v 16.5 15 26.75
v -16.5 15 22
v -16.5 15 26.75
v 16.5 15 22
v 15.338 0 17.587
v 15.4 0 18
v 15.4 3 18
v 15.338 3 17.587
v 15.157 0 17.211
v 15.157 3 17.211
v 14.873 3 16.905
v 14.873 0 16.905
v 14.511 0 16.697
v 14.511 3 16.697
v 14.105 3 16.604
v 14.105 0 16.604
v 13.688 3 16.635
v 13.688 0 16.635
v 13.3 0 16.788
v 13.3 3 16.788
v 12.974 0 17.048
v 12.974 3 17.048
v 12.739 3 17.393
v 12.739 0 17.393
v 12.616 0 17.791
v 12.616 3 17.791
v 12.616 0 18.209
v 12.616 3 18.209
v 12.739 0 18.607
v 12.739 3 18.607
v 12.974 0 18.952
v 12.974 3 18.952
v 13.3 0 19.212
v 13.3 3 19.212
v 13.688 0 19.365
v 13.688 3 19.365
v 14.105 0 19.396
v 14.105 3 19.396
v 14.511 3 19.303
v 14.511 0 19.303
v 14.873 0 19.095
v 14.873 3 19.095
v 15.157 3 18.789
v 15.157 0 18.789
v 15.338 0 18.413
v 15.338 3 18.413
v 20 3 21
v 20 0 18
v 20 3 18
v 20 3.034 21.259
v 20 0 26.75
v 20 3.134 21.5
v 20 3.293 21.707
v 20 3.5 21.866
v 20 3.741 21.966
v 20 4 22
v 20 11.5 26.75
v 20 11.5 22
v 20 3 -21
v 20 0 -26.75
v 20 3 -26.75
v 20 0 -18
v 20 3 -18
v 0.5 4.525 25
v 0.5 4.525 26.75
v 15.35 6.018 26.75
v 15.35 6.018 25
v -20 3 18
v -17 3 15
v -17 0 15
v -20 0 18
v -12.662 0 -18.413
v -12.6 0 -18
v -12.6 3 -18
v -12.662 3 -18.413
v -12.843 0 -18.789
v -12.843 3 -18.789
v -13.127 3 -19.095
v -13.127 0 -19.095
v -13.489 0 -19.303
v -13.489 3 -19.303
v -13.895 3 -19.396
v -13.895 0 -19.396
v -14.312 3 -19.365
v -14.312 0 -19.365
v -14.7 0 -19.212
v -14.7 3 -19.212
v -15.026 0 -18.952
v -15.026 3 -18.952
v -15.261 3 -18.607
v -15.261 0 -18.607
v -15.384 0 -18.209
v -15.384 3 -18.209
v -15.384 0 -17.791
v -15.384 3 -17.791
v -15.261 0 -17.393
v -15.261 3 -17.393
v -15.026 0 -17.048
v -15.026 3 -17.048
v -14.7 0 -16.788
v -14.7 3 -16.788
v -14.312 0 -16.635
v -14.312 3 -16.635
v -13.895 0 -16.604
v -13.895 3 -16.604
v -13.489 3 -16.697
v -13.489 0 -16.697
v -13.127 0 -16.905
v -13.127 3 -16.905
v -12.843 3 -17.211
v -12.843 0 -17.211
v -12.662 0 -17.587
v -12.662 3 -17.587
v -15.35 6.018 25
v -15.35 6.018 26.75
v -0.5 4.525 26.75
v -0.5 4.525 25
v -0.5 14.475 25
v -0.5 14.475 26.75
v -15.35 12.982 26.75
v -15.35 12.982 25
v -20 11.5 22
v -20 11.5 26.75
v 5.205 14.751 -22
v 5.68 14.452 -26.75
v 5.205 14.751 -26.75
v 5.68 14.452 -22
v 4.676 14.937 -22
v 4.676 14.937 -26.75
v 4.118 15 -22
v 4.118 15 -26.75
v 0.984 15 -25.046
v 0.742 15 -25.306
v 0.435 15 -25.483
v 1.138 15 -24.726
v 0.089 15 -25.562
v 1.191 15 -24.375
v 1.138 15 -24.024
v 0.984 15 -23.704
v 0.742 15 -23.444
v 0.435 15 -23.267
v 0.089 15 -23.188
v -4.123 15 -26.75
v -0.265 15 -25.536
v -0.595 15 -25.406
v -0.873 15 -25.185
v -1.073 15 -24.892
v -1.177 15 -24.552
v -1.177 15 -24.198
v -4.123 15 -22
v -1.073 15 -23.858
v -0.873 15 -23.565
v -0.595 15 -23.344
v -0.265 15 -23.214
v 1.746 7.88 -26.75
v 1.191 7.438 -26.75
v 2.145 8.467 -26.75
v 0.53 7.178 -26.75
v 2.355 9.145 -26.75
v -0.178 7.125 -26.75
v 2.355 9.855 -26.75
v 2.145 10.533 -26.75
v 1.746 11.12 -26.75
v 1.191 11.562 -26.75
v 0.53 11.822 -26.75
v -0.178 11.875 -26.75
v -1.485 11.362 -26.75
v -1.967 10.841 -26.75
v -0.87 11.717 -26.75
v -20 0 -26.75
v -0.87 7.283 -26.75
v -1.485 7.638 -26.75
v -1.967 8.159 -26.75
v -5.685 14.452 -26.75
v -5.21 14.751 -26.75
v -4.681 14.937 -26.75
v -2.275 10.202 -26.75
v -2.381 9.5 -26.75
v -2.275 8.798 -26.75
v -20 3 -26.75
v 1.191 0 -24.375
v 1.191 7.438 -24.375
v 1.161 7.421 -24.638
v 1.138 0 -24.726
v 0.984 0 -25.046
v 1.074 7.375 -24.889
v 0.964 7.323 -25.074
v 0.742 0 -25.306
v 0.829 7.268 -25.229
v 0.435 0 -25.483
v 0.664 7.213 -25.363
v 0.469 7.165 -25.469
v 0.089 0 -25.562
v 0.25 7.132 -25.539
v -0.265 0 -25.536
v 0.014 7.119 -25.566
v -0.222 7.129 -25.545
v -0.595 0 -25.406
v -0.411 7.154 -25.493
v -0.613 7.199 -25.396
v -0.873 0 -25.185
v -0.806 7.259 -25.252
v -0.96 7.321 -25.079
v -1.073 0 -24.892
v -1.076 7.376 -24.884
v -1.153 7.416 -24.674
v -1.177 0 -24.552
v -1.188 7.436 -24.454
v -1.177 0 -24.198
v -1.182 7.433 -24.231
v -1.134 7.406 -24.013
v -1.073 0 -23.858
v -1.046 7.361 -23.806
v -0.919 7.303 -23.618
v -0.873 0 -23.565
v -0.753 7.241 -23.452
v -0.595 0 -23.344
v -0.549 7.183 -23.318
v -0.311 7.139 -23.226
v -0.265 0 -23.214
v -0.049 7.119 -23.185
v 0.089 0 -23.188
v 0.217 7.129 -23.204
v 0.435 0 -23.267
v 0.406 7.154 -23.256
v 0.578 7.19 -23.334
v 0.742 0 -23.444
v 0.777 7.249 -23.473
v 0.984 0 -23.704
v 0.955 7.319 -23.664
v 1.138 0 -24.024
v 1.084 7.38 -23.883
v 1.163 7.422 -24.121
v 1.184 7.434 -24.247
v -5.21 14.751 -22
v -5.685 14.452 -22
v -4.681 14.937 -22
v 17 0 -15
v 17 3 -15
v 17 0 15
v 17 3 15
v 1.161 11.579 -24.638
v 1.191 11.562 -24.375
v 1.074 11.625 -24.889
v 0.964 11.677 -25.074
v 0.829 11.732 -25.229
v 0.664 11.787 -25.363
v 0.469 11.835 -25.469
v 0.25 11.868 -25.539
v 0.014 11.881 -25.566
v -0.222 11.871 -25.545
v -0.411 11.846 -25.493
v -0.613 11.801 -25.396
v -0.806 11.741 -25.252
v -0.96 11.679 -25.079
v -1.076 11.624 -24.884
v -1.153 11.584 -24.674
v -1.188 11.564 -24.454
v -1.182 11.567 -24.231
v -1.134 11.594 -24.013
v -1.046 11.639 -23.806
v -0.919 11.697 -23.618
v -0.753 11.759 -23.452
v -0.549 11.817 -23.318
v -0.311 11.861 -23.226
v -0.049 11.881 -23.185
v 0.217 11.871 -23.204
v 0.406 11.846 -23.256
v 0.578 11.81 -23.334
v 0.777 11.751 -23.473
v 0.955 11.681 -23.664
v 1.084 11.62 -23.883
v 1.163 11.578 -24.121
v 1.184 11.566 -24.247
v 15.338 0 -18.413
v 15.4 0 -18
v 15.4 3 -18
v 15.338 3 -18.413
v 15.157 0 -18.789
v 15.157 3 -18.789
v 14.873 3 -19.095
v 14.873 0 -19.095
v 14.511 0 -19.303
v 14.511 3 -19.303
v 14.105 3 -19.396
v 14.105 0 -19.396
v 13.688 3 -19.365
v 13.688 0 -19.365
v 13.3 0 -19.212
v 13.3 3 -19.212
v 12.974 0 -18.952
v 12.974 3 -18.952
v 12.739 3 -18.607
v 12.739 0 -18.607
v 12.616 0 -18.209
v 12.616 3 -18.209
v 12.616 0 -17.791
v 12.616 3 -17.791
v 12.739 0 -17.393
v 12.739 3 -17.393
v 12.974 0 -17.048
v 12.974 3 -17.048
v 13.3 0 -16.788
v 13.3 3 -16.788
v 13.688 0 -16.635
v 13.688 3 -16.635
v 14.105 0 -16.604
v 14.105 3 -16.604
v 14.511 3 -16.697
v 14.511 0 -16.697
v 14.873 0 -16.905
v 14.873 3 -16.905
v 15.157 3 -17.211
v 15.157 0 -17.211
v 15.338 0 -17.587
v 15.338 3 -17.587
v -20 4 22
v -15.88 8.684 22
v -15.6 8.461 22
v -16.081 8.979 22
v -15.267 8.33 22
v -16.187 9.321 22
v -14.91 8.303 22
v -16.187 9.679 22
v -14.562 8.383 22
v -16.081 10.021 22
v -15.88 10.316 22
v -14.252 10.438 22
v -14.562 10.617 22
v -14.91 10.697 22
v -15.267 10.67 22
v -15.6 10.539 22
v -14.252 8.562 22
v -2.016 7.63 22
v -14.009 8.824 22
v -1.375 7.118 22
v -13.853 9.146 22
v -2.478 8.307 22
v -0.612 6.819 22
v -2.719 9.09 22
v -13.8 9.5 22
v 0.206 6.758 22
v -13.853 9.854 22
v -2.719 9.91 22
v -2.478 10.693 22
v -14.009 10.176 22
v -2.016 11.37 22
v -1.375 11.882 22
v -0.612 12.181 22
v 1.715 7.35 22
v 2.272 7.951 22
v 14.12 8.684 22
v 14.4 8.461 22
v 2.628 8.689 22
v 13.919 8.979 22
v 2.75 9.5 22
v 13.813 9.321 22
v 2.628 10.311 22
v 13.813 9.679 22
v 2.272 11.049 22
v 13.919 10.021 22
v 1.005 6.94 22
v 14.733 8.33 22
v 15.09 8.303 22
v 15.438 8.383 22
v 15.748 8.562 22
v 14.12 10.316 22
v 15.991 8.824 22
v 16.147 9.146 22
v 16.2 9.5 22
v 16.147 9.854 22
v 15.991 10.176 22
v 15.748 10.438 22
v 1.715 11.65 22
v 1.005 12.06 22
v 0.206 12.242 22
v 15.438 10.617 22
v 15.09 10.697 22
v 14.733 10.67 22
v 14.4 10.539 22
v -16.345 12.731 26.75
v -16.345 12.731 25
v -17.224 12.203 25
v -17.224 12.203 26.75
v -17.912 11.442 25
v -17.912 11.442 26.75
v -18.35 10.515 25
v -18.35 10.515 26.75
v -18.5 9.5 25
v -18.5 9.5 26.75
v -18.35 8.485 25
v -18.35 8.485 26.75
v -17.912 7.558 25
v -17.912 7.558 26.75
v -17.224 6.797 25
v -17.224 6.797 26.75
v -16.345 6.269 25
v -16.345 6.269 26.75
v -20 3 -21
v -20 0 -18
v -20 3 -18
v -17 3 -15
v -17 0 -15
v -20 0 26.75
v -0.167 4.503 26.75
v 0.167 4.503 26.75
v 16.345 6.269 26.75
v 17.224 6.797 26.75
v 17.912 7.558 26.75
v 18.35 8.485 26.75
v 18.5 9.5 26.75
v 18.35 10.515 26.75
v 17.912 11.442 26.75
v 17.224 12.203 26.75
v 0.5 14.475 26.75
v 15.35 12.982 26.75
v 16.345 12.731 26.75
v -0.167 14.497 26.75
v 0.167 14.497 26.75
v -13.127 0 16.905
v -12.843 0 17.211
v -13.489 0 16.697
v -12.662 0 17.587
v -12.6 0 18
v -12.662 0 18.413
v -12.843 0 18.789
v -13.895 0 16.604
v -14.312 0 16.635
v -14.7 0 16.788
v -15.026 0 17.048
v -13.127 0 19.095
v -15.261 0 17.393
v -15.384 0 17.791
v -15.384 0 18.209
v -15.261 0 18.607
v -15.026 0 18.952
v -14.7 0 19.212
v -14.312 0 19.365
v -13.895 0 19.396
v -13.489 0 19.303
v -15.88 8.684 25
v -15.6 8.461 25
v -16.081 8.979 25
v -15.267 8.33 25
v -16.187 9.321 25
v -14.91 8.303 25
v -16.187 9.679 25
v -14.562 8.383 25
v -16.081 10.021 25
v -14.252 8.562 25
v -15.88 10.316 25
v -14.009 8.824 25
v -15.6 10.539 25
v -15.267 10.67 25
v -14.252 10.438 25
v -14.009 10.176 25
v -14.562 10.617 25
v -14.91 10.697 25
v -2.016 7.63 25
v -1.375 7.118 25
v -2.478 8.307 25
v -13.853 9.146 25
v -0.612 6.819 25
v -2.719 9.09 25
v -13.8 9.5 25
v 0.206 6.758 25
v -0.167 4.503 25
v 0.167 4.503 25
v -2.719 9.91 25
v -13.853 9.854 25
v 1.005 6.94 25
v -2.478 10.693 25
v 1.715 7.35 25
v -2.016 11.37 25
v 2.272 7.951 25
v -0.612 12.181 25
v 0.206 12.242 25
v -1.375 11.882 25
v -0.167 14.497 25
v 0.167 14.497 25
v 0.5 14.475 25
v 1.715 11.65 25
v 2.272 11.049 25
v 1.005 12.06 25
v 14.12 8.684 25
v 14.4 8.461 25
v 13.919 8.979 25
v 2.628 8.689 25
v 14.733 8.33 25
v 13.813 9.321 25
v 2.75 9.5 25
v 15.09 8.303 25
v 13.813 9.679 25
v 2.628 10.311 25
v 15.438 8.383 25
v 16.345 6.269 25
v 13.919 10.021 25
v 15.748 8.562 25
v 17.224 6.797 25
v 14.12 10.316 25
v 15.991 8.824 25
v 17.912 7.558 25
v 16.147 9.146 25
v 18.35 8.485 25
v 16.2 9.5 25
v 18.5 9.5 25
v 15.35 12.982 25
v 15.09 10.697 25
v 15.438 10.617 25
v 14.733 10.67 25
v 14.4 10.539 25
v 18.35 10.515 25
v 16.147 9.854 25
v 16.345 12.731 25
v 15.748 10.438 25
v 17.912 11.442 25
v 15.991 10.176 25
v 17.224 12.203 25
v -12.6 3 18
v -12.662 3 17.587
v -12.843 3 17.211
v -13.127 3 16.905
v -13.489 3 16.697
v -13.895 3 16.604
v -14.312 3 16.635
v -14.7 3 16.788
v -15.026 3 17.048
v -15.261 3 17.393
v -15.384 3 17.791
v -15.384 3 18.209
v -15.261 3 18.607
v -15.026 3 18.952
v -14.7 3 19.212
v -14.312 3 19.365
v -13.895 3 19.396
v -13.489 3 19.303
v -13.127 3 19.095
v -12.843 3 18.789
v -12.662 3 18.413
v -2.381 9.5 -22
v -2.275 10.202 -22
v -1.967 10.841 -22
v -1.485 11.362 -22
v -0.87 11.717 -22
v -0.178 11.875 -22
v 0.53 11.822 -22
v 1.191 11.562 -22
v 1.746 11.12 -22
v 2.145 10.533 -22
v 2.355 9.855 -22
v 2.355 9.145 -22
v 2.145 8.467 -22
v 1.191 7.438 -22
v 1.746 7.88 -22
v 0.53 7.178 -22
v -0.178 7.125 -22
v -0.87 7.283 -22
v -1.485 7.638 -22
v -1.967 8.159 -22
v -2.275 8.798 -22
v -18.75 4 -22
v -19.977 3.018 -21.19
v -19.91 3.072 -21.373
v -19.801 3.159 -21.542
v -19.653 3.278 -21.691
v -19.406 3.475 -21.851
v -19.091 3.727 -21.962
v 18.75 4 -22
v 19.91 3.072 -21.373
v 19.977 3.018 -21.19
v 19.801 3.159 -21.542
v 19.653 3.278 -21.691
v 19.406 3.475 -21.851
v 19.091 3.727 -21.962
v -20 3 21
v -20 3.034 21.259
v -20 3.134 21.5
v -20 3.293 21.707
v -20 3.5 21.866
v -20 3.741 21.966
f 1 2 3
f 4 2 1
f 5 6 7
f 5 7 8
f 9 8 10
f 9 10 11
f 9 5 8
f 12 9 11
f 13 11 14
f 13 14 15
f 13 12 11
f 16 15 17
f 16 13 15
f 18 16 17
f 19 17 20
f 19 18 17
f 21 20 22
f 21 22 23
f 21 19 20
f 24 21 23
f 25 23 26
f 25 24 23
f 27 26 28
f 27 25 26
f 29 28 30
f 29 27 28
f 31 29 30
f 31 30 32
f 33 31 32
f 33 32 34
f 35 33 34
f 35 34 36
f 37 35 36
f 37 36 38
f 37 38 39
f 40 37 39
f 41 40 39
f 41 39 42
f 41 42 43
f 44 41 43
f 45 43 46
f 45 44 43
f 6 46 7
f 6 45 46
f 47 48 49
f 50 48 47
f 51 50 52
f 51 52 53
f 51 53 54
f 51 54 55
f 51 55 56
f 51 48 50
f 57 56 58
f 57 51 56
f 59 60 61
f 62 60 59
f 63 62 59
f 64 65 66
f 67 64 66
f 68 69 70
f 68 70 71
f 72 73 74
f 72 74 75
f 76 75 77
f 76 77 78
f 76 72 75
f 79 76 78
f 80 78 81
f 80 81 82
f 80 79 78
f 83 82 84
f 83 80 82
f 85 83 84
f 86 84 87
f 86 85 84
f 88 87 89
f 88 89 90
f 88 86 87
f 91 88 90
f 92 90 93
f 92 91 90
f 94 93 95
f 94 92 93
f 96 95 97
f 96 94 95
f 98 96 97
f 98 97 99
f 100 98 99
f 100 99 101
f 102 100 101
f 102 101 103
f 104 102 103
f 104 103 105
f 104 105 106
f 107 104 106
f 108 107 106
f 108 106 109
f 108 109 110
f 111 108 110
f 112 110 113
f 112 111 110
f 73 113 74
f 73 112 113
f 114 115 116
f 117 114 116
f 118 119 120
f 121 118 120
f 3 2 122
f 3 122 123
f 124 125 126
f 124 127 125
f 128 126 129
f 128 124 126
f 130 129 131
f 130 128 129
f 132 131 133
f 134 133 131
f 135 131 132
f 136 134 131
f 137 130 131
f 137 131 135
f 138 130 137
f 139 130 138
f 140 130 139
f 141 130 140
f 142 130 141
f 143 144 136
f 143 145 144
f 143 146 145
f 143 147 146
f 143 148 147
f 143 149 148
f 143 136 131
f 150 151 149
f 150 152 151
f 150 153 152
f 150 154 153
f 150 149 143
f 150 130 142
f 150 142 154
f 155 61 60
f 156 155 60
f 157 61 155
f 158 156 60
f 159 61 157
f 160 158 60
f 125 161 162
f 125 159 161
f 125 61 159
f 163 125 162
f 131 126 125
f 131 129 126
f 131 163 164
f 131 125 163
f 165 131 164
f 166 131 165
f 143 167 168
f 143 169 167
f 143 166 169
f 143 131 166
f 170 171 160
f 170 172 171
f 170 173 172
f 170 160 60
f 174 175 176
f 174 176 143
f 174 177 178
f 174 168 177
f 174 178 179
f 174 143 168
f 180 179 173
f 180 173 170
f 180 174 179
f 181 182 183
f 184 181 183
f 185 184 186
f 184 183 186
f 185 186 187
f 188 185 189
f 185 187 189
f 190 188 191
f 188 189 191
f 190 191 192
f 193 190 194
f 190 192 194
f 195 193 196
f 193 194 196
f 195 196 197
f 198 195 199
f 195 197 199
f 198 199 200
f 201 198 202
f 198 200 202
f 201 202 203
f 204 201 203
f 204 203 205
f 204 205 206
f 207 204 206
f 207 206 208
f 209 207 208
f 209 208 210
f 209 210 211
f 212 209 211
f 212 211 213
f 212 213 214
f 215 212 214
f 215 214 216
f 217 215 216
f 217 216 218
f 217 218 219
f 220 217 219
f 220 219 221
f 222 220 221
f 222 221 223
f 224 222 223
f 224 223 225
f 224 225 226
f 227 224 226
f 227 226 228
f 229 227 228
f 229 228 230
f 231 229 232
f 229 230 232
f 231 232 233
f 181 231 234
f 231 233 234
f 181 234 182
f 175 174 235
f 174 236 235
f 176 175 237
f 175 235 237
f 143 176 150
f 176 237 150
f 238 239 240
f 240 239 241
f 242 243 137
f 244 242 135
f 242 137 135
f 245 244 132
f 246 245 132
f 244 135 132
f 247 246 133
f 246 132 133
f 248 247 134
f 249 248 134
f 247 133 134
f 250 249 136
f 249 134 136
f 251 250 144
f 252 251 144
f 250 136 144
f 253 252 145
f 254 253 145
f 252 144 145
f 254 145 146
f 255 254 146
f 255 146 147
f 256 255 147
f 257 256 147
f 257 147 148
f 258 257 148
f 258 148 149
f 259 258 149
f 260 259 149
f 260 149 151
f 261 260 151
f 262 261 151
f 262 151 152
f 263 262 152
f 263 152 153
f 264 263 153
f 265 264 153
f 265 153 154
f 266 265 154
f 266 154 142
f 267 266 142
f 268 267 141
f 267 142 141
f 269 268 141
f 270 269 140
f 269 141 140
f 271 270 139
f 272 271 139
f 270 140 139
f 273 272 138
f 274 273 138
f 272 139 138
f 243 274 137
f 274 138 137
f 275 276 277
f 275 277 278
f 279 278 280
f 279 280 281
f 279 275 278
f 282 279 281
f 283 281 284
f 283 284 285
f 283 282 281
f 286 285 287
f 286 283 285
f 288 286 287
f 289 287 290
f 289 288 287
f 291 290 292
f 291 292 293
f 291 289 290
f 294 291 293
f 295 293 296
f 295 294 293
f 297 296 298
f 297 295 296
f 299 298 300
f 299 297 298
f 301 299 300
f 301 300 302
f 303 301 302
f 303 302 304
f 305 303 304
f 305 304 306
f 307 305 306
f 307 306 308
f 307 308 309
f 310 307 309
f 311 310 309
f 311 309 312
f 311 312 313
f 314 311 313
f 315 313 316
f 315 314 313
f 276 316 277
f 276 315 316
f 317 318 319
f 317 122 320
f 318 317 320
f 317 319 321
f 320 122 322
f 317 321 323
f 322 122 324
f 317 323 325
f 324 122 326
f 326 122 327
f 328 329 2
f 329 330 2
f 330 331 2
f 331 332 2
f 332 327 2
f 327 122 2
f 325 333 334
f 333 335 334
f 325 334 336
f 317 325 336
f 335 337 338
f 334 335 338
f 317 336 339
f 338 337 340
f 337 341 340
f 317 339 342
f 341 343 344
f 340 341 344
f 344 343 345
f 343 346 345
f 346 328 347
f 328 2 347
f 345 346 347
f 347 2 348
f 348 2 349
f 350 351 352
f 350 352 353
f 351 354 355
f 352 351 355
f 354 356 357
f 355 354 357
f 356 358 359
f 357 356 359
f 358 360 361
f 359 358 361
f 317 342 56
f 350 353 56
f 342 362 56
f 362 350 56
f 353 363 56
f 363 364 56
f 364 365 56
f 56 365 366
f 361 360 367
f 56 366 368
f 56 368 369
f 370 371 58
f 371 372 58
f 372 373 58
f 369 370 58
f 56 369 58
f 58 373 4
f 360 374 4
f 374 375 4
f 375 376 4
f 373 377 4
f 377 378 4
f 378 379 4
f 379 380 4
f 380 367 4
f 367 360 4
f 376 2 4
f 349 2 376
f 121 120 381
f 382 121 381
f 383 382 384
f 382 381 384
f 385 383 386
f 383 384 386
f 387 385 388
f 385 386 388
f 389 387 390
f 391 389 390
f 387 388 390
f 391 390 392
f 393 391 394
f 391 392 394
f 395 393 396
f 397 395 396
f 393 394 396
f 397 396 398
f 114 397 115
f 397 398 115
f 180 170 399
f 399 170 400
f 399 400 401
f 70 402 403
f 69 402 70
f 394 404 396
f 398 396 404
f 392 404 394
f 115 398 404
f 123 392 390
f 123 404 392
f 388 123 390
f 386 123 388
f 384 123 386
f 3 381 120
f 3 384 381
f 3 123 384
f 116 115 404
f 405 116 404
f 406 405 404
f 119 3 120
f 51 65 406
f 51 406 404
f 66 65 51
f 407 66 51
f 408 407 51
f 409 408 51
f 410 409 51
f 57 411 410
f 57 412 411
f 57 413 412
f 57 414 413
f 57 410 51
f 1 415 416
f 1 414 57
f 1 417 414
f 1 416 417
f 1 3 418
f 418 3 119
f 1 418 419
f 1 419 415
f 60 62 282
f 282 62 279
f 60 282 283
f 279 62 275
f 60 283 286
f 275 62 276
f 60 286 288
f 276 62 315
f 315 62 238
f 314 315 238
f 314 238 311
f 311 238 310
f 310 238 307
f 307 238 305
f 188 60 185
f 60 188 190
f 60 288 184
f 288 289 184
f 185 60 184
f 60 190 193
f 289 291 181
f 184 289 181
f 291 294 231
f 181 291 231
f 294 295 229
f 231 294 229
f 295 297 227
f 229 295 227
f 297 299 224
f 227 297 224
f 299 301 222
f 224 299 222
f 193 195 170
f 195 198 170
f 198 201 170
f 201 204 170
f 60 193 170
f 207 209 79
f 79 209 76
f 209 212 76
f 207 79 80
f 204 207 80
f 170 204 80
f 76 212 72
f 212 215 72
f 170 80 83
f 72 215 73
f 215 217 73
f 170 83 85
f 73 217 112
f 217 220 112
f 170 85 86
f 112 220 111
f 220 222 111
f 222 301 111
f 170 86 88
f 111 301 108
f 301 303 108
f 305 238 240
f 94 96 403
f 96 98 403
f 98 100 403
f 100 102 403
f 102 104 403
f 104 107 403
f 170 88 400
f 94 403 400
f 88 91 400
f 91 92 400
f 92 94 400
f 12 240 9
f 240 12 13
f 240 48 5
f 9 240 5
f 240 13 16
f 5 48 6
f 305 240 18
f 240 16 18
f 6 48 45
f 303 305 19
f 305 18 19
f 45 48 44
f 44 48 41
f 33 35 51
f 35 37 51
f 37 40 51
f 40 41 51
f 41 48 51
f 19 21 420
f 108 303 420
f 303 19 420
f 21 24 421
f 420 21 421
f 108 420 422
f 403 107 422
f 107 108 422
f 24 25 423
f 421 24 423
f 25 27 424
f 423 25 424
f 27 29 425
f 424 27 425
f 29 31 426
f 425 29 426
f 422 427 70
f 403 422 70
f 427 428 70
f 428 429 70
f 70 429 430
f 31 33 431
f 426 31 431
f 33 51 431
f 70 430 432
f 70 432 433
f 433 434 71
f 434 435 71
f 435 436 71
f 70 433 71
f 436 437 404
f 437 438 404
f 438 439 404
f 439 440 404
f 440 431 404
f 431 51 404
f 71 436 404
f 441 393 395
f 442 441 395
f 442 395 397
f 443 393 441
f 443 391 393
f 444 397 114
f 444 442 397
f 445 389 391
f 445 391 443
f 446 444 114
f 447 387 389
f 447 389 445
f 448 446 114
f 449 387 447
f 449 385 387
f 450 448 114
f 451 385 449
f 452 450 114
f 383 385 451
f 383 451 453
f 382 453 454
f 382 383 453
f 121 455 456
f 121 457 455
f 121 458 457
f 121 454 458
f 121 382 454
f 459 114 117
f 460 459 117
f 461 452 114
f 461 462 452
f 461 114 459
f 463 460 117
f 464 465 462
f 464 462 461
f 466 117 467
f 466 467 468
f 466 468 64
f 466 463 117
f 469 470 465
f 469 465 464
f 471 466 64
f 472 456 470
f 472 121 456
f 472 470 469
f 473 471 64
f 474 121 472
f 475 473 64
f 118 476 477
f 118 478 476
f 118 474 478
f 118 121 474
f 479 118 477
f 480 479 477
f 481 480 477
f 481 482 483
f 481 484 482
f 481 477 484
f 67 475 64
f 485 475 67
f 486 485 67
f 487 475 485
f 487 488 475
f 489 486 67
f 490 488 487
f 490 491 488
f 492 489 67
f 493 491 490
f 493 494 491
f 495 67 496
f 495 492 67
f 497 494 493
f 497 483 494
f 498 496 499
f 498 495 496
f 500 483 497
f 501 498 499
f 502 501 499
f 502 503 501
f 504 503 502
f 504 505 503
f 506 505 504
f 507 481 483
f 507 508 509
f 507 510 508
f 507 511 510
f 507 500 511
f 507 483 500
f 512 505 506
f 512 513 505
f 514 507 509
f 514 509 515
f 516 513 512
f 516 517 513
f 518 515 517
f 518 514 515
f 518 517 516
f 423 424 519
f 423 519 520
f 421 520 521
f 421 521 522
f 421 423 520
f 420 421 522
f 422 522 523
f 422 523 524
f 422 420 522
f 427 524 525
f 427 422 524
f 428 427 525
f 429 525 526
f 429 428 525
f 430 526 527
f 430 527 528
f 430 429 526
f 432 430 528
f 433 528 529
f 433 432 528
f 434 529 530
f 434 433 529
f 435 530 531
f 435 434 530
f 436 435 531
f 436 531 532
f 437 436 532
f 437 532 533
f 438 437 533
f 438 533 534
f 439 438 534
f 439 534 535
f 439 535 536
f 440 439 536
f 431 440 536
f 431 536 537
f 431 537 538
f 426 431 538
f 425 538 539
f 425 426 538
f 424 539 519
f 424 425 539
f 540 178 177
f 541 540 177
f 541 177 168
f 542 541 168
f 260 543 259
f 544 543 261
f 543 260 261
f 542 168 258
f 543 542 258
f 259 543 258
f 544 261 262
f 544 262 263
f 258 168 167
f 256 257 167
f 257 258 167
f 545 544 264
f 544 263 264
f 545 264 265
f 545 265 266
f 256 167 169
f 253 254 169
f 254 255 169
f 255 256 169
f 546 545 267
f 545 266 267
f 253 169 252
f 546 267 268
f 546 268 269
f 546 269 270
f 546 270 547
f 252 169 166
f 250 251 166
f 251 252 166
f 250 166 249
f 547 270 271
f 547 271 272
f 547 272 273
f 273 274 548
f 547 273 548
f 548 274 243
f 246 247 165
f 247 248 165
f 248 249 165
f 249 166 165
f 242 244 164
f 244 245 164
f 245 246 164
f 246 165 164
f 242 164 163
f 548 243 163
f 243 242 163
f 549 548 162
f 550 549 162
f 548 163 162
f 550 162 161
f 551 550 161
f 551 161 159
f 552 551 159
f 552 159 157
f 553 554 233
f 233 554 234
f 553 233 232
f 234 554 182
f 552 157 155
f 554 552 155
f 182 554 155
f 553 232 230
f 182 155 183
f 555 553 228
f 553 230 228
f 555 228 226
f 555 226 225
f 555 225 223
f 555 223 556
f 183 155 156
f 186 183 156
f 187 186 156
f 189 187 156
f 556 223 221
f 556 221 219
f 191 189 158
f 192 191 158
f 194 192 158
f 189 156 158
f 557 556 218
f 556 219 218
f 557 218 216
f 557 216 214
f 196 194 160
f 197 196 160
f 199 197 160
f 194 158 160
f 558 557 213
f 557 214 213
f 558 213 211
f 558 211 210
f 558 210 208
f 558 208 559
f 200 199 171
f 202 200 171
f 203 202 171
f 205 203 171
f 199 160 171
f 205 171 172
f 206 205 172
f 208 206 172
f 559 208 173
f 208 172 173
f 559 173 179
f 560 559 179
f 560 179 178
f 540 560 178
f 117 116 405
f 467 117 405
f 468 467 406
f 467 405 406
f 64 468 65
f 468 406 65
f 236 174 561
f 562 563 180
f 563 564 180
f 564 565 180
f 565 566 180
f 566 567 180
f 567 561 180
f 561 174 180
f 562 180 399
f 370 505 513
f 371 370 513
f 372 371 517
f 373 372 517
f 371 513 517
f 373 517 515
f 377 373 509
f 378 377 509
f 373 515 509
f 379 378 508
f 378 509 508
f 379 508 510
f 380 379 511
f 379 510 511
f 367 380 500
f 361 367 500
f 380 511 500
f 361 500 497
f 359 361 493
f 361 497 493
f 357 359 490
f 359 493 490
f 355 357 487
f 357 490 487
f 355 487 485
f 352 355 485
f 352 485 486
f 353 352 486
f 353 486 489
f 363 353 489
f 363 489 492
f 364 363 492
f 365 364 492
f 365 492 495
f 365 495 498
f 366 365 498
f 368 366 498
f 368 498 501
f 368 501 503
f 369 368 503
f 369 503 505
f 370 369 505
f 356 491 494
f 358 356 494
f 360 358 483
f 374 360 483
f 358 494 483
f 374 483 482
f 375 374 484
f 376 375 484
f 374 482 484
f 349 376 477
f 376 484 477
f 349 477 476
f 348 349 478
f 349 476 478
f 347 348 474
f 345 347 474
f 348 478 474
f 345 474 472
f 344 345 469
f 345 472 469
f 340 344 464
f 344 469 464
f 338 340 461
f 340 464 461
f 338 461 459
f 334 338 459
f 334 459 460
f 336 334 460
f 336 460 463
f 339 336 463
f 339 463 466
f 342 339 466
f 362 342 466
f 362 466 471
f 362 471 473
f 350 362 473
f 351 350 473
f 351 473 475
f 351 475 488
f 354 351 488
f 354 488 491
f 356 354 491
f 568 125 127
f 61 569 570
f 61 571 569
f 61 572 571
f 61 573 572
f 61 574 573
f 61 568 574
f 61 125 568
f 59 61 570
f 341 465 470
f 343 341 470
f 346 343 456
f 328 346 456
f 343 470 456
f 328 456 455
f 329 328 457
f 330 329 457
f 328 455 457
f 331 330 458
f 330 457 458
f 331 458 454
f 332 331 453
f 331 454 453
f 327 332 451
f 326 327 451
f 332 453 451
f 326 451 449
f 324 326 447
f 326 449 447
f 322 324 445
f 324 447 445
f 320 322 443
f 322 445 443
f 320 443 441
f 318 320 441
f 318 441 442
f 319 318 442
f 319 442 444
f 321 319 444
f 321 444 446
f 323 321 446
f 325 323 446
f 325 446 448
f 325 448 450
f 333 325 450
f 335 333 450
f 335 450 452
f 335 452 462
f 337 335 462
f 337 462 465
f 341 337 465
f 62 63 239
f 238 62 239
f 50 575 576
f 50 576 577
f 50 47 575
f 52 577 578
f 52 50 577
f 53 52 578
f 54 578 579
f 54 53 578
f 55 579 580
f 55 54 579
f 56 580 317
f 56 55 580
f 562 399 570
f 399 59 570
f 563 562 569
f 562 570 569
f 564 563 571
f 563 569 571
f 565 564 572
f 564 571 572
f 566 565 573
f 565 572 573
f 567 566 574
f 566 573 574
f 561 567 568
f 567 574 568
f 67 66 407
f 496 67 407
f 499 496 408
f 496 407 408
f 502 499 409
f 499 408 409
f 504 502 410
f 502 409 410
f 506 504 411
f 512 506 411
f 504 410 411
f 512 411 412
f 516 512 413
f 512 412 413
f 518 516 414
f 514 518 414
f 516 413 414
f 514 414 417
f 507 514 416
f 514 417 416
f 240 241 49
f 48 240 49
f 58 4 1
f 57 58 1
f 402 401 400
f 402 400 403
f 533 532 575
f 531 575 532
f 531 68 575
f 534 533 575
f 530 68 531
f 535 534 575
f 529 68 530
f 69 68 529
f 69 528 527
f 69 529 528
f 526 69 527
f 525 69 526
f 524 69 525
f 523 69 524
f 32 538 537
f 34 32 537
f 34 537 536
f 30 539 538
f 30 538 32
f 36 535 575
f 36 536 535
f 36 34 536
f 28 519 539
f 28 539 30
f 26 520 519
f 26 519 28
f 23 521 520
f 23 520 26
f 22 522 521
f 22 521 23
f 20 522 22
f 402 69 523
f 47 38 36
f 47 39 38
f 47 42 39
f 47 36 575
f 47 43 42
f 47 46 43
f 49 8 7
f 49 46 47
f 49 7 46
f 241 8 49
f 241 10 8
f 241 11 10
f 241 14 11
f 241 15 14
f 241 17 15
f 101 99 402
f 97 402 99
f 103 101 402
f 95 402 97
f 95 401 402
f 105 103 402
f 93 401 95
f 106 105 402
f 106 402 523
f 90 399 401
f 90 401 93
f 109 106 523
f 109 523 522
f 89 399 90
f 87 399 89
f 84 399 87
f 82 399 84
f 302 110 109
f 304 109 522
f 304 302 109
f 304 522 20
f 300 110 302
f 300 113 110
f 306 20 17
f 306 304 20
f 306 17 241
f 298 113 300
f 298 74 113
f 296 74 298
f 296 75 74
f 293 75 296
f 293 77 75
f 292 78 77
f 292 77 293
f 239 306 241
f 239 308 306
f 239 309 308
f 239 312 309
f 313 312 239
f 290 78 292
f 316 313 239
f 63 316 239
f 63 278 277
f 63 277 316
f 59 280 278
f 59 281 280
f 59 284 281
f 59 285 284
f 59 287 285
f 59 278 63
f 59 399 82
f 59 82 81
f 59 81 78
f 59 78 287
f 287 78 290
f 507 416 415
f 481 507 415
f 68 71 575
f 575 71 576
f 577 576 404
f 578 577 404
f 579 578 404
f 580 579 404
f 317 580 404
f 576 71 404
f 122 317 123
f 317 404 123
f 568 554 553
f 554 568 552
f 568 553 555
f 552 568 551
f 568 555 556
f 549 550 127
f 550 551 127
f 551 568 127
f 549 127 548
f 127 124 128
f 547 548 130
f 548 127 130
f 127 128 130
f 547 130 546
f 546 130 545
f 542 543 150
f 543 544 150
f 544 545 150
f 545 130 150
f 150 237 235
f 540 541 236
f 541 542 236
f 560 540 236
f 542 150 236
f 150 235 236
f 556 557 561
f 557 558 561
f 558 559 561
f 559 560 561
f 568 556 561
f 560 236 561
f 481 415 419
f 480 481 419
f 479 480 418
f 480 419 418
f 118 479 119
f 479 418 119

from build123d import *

# Parameters (mm, degrees)
SKETCH1_W           = 40
SKETCH1_H           = 44
SKETCH1_R           = 1.4
BOSS_EXTRUDE1_DEPTH = 3
SKETCH2_W           = 40
SKETCH2_H           = 15
BOSS_EXTRUDE2_DEPTH = 4.75
SKETCH3_W           = 40
SKETCH3_H           = 15
BOSS_EXTRUDE3_DEPTH = 4.75
CUT_EXTRUDE1_DEPTH  = 1.75
CUT_EXTRUDE2_REACH  = 53.75
SKETCH5_R           = 1.2
SKETCH5_R_2         = 2.75
CUT_EXTRUDE3_REACH  = 55.5
SKETCH6_R           = 2.38125
SKETCH7_R           = 1.190625
CUT_EXTRUDE4_DEPTH  = 16
CUT_EXTRUDE5_REACH  = 5
CUT_EXTRUDE6_REACH  = 55.5
FILLET1_R           = 1
CHAMFER1_SIZE       = 3.5
FILLET2_R           = 2.5


with BuildPart() as part:
    # Sketch1 → Boss-Extrude1 (new body)
    with BuildSketch(Plane(origin=(0, 0, 0), x_dir=(1, 0, 0), z_dir=(0, 1, 0))):
        Rectangle(SKETCH1_W, SKETCH1_H)
        with Locations((-14, 18)):
            Circle(SKETCH1_R, mode=Mode.SUBTRACT)
        with Locations((14, 18)):
            Circle(SKETCH1_R, mode=Mode.SUBTRACT)
        with Locations((-14, -18)):
            Circle(SKETCH1_R, mode=Mode.SUBTRACT)
        with Locations((14, -18)):
            Circle(SKETCH1_R, mode=Mode.SUBTRACT)
    extrude(amount=BOSS_EXTRUDE1_DEPTH)

    # Sketch2 → Boss-Extrude2 (add)
    with BuildSketch(Plane.XY.offset(22)):
        with Locations((0, 7.5)):
            Rectangle(SKETCH2_W, SKETCH2_H)
    extrude(amount=BOSS_EXTRUDE2_DEPTH)

    # Sketch3 → Boss-Extrude3 (add)
    with BuildSketch(Plane(origin=(0, 0, -22), x_dir=(-1, 0, 0), z_dir=(0, 0, -1))):
        with Locations((0, 7.5)):
            Rectangle(SKETCH3_W, SKETCH3_H)
    extrude(amount=BOSS_EXTRUDE3_DEPTH)

    # Sketch4 → Cut-Extrude1 (cut)
    with BuildSketch(Plane.XY.offset(26.75)):
        with BuildLine():
            Line((15.35, 12.98245603), (0.5, 14.474937186))
            ThreePointArc((0.5, 14.474937186), (0, 14.5), (-0.5, 14.474937186))
            Line((-0.5, 14.474937186), (-15.35, 12.98245603))
            ThreePointArc((-15.35, 12.98245603), (-18.5, 9.5), (-15.35, 6.01754397))
            Line((-15.35, 6.01754397), (-0.5, 4.525062814))
            ThreePointArc((-0.5, 4.525062814), (0, 4.5), (0.5, 4.525062814))
            Line((0.5, 4.525062814), (15.35, 6.01754397))
            ThreePointArc((15.35, 6.01754397), (18.5, 9.5), (15.35, 12.98245603))
        make_face()
    extrude(amount=-CUT_EXTRUDE1_DEPTH, mode=Mode.SUBTRACT)

    # Sketch5 → Cut-Extrude2 (cut, up to next)
    with BuildSketch(Plane.XY.offset(25), mode=Mode.PRIVATE) as cut_extrude2_sk1:
        with Locations((-15, 9.5)):
            Circle(SKETCH5_R)
    cut_extrude2_tool1 = extrude(cut_extrude2_sk1.sketch, amount=-CUT_EXTRUDE2_REACH, mode=Mode.PRIVATE) & part.part
    add(cut_extrude2_tool1.solids().sort_by_distance((-15, 9.5, 25))[0], mode=Mode.SUBTRACT)
    # Sketch5 → Cut-Extrude2 (cut, up to next)
    with BuildSketch(Plane.XY.offset(25), mode=Mode.PRIVATE) as cut_extrude2_sk2:
        with Locations((15, 9.5)):
            Circle(SKETCH5_R)
    cut_extrude2_tool2 = extrude(cut_extrude2_sk2.sketch, amount=-CUT_EXTRUDE2_REACH, mode=Mode.PRIVATE) & part.part
    add(cut_extrude2_tool2.solids().sort_by_distance((15, 9.5, 25))[0], mode=Mode.SUBTRACT)
    # Sketch5 → Cut-Extrude2 (cut, up to next)
    with BuildSketch(Plane.XY.offset(25), mode=Mode.PRIVATE) as cut_extrude2_sk3:
        with Locations((0, 9.5)):
            Circle(SKETCH5_R_2)
    cut_extrude2_tool3 = extrude(cut_extrude2_sk3.sketch, amount=-CUT_EXTRUDE2_REACH, mode=Mode.PRIVATE) & part.part
    add(cut_extrude2_tool3.solids().sort_by_distance((0, 9.5, 25))[0], mode=Mode.SUBTRACT)

    # Sketch6 → Cut-Extrude3 (cut, up to next)
    with BuildSketch(Plane(origin=(0, 0, -26.75), x_dir=(-1, 0, 0), z_dir=(0, 0, -1)), mode=Mode.PRIVATE) as cut_extrude3_sk1:
        with Locations((0, 9.5)):
            Circle(SKETCH6_R)
    cut_extrude3_tool1 = extrude(cut_extrude3_sk1.sketch, amount=-CUT_EXTRUDE3_REACH, mode=Mode.PRIVATE) & part.part
    add(cut_extrude3_tool1.solids().sort_by_distance((0, 9.5, -26.75))[0], mode=Mode.SUBTRACT)

    # Sketch7 → Cut-Extrude4 (cut, through all)
    with BuildSketch(Plane(origin=(0, 15, 0), x_dir=(1, 0, 0), z_dir=(0, 1, 0))):
        with Locations((0, 24.375)):
            Circle(SKETCH7_R)
    extrude(amount=-CUT_EXTRUDE4_DEPTH, mode=Mode.SUBTRACT)

    # Sketch8 → Cut-Extrude5 (cut, up to next)
    with BuildSketch(Plane(origin=(0, 3, 0), x_dir=(1, 0, 0), z_dir=(0, 1, 0)), mode=Mode.PRIVATE) as cut_extrude5_sk1:
        Polygon((-20, 18), (-17, 15), (-17, -15), (-20, -18), align=None)
    cut_extrude5_tool1 = extrude(cut_extrude5_sk1.sketch, amount=-CUT_EXTRUDE5_REACH, mode=Mode.PRIVATE) & part.part
    add(cut_extrude5_tool1.solids().sort_by_distance((-18.545455, 3, 0))[0], mode=Mode.SUBTRACT)
    # Sketch8 → Cut-Extrude5 (cut, up to next)
    with BuildSketch(Plane(origin=(0, 3, 0), x_dir=(1, 0, 0), z_dir=(0, 1, 0)), mode=Mode.PRIVATE) as cut_extrude5_sk2:
        Polygon((17, -15), (20, -18), (20, 18), (17, 15), align=None)
    cut_extrude5_tool2 = extrude(cut_extrude5_sk2.sketch, amount=-CUT_EXTRUDE5_REACH, mode=Mode.PRIVATE) & part.part
    add(cut_extrude5_tool2.solids().sort_by_distance((18.545455, 3, 0))[0], mode=Mode.SUBTRACT)

    # Sketch9 → Cut-Extrude6 (cut, up to next)
    with BuildSketch(Plane(origin=(0, 0, -26.75), x_dir=(-1, 0, 0), z_dir=(0, 0, -1)), mode=Mode.PRIVATE) as cut_extrude6_sk1:
        Polygon((-20, 15), (-4.995024308, 15), (-20, 3), align=None)
    cut_extrude6_tool1 = extrude(cut_extrude6_sk1.sketch, amount=-CUT_EXTRUDE6_REACH, mode=Mode.PRIVATE) & part.part
    add(cut_extrude6_tool1.solids().sort_by_distance((14.998341, 11, -26.75))[0], mode=Mode.SUBTRACT)
    # Sketch9 → Cut-Extrude6 (cut, up to next)
    with BuildSketch(Plane(origin=(0, 0, -26.75), x_dir=(-1, 0, 0), z_dir=(0, 0, -1)), mode=Mode.PRIVATE) as cut_extrude6_sk2:
        Polygon((20, 15), (5, 15), (20, 3), align=None)
    cut_extrude6_tool2 = extrude(cut_extrude6_sk2.sketch, amount=-CUT_EXTRUDE6_REACH, mode=Mode.PRIVATE) & part.part
    add(cut_extrude6_tool2.solids().sort_by_distance((-15, 11, -26.75))[0], mode=Mode.SUBTRACT)

    # Fillet1
    fillet1_edges = [part.edges().sort_by_distance(p)[0] for p in [
        (0, 3, -22),
        (0, 3, 22),
    ]]
    fillet(fillet1_edges, radius=FILLET1_R)

    # Chamfer1
    chamfer1_edges = [part.edges().sort_by_distance(p)[0] for p in [
        (-20, 15, 24.375),
        (20, 15, 24.375),
    ]]
    chamfer(chamfer1_edges, length=CHAMFER1_SIZE)

    # Fillet2
    fillet2_edges = [part.edges().sort_by_distance(p)[0] for p in [
        (4.995024308, 15, -24.375),
        (-5, 15, -24.375),
    ]]
    fillet(fillet2_edges, radius=FILLET2_R)


solid = part.part
